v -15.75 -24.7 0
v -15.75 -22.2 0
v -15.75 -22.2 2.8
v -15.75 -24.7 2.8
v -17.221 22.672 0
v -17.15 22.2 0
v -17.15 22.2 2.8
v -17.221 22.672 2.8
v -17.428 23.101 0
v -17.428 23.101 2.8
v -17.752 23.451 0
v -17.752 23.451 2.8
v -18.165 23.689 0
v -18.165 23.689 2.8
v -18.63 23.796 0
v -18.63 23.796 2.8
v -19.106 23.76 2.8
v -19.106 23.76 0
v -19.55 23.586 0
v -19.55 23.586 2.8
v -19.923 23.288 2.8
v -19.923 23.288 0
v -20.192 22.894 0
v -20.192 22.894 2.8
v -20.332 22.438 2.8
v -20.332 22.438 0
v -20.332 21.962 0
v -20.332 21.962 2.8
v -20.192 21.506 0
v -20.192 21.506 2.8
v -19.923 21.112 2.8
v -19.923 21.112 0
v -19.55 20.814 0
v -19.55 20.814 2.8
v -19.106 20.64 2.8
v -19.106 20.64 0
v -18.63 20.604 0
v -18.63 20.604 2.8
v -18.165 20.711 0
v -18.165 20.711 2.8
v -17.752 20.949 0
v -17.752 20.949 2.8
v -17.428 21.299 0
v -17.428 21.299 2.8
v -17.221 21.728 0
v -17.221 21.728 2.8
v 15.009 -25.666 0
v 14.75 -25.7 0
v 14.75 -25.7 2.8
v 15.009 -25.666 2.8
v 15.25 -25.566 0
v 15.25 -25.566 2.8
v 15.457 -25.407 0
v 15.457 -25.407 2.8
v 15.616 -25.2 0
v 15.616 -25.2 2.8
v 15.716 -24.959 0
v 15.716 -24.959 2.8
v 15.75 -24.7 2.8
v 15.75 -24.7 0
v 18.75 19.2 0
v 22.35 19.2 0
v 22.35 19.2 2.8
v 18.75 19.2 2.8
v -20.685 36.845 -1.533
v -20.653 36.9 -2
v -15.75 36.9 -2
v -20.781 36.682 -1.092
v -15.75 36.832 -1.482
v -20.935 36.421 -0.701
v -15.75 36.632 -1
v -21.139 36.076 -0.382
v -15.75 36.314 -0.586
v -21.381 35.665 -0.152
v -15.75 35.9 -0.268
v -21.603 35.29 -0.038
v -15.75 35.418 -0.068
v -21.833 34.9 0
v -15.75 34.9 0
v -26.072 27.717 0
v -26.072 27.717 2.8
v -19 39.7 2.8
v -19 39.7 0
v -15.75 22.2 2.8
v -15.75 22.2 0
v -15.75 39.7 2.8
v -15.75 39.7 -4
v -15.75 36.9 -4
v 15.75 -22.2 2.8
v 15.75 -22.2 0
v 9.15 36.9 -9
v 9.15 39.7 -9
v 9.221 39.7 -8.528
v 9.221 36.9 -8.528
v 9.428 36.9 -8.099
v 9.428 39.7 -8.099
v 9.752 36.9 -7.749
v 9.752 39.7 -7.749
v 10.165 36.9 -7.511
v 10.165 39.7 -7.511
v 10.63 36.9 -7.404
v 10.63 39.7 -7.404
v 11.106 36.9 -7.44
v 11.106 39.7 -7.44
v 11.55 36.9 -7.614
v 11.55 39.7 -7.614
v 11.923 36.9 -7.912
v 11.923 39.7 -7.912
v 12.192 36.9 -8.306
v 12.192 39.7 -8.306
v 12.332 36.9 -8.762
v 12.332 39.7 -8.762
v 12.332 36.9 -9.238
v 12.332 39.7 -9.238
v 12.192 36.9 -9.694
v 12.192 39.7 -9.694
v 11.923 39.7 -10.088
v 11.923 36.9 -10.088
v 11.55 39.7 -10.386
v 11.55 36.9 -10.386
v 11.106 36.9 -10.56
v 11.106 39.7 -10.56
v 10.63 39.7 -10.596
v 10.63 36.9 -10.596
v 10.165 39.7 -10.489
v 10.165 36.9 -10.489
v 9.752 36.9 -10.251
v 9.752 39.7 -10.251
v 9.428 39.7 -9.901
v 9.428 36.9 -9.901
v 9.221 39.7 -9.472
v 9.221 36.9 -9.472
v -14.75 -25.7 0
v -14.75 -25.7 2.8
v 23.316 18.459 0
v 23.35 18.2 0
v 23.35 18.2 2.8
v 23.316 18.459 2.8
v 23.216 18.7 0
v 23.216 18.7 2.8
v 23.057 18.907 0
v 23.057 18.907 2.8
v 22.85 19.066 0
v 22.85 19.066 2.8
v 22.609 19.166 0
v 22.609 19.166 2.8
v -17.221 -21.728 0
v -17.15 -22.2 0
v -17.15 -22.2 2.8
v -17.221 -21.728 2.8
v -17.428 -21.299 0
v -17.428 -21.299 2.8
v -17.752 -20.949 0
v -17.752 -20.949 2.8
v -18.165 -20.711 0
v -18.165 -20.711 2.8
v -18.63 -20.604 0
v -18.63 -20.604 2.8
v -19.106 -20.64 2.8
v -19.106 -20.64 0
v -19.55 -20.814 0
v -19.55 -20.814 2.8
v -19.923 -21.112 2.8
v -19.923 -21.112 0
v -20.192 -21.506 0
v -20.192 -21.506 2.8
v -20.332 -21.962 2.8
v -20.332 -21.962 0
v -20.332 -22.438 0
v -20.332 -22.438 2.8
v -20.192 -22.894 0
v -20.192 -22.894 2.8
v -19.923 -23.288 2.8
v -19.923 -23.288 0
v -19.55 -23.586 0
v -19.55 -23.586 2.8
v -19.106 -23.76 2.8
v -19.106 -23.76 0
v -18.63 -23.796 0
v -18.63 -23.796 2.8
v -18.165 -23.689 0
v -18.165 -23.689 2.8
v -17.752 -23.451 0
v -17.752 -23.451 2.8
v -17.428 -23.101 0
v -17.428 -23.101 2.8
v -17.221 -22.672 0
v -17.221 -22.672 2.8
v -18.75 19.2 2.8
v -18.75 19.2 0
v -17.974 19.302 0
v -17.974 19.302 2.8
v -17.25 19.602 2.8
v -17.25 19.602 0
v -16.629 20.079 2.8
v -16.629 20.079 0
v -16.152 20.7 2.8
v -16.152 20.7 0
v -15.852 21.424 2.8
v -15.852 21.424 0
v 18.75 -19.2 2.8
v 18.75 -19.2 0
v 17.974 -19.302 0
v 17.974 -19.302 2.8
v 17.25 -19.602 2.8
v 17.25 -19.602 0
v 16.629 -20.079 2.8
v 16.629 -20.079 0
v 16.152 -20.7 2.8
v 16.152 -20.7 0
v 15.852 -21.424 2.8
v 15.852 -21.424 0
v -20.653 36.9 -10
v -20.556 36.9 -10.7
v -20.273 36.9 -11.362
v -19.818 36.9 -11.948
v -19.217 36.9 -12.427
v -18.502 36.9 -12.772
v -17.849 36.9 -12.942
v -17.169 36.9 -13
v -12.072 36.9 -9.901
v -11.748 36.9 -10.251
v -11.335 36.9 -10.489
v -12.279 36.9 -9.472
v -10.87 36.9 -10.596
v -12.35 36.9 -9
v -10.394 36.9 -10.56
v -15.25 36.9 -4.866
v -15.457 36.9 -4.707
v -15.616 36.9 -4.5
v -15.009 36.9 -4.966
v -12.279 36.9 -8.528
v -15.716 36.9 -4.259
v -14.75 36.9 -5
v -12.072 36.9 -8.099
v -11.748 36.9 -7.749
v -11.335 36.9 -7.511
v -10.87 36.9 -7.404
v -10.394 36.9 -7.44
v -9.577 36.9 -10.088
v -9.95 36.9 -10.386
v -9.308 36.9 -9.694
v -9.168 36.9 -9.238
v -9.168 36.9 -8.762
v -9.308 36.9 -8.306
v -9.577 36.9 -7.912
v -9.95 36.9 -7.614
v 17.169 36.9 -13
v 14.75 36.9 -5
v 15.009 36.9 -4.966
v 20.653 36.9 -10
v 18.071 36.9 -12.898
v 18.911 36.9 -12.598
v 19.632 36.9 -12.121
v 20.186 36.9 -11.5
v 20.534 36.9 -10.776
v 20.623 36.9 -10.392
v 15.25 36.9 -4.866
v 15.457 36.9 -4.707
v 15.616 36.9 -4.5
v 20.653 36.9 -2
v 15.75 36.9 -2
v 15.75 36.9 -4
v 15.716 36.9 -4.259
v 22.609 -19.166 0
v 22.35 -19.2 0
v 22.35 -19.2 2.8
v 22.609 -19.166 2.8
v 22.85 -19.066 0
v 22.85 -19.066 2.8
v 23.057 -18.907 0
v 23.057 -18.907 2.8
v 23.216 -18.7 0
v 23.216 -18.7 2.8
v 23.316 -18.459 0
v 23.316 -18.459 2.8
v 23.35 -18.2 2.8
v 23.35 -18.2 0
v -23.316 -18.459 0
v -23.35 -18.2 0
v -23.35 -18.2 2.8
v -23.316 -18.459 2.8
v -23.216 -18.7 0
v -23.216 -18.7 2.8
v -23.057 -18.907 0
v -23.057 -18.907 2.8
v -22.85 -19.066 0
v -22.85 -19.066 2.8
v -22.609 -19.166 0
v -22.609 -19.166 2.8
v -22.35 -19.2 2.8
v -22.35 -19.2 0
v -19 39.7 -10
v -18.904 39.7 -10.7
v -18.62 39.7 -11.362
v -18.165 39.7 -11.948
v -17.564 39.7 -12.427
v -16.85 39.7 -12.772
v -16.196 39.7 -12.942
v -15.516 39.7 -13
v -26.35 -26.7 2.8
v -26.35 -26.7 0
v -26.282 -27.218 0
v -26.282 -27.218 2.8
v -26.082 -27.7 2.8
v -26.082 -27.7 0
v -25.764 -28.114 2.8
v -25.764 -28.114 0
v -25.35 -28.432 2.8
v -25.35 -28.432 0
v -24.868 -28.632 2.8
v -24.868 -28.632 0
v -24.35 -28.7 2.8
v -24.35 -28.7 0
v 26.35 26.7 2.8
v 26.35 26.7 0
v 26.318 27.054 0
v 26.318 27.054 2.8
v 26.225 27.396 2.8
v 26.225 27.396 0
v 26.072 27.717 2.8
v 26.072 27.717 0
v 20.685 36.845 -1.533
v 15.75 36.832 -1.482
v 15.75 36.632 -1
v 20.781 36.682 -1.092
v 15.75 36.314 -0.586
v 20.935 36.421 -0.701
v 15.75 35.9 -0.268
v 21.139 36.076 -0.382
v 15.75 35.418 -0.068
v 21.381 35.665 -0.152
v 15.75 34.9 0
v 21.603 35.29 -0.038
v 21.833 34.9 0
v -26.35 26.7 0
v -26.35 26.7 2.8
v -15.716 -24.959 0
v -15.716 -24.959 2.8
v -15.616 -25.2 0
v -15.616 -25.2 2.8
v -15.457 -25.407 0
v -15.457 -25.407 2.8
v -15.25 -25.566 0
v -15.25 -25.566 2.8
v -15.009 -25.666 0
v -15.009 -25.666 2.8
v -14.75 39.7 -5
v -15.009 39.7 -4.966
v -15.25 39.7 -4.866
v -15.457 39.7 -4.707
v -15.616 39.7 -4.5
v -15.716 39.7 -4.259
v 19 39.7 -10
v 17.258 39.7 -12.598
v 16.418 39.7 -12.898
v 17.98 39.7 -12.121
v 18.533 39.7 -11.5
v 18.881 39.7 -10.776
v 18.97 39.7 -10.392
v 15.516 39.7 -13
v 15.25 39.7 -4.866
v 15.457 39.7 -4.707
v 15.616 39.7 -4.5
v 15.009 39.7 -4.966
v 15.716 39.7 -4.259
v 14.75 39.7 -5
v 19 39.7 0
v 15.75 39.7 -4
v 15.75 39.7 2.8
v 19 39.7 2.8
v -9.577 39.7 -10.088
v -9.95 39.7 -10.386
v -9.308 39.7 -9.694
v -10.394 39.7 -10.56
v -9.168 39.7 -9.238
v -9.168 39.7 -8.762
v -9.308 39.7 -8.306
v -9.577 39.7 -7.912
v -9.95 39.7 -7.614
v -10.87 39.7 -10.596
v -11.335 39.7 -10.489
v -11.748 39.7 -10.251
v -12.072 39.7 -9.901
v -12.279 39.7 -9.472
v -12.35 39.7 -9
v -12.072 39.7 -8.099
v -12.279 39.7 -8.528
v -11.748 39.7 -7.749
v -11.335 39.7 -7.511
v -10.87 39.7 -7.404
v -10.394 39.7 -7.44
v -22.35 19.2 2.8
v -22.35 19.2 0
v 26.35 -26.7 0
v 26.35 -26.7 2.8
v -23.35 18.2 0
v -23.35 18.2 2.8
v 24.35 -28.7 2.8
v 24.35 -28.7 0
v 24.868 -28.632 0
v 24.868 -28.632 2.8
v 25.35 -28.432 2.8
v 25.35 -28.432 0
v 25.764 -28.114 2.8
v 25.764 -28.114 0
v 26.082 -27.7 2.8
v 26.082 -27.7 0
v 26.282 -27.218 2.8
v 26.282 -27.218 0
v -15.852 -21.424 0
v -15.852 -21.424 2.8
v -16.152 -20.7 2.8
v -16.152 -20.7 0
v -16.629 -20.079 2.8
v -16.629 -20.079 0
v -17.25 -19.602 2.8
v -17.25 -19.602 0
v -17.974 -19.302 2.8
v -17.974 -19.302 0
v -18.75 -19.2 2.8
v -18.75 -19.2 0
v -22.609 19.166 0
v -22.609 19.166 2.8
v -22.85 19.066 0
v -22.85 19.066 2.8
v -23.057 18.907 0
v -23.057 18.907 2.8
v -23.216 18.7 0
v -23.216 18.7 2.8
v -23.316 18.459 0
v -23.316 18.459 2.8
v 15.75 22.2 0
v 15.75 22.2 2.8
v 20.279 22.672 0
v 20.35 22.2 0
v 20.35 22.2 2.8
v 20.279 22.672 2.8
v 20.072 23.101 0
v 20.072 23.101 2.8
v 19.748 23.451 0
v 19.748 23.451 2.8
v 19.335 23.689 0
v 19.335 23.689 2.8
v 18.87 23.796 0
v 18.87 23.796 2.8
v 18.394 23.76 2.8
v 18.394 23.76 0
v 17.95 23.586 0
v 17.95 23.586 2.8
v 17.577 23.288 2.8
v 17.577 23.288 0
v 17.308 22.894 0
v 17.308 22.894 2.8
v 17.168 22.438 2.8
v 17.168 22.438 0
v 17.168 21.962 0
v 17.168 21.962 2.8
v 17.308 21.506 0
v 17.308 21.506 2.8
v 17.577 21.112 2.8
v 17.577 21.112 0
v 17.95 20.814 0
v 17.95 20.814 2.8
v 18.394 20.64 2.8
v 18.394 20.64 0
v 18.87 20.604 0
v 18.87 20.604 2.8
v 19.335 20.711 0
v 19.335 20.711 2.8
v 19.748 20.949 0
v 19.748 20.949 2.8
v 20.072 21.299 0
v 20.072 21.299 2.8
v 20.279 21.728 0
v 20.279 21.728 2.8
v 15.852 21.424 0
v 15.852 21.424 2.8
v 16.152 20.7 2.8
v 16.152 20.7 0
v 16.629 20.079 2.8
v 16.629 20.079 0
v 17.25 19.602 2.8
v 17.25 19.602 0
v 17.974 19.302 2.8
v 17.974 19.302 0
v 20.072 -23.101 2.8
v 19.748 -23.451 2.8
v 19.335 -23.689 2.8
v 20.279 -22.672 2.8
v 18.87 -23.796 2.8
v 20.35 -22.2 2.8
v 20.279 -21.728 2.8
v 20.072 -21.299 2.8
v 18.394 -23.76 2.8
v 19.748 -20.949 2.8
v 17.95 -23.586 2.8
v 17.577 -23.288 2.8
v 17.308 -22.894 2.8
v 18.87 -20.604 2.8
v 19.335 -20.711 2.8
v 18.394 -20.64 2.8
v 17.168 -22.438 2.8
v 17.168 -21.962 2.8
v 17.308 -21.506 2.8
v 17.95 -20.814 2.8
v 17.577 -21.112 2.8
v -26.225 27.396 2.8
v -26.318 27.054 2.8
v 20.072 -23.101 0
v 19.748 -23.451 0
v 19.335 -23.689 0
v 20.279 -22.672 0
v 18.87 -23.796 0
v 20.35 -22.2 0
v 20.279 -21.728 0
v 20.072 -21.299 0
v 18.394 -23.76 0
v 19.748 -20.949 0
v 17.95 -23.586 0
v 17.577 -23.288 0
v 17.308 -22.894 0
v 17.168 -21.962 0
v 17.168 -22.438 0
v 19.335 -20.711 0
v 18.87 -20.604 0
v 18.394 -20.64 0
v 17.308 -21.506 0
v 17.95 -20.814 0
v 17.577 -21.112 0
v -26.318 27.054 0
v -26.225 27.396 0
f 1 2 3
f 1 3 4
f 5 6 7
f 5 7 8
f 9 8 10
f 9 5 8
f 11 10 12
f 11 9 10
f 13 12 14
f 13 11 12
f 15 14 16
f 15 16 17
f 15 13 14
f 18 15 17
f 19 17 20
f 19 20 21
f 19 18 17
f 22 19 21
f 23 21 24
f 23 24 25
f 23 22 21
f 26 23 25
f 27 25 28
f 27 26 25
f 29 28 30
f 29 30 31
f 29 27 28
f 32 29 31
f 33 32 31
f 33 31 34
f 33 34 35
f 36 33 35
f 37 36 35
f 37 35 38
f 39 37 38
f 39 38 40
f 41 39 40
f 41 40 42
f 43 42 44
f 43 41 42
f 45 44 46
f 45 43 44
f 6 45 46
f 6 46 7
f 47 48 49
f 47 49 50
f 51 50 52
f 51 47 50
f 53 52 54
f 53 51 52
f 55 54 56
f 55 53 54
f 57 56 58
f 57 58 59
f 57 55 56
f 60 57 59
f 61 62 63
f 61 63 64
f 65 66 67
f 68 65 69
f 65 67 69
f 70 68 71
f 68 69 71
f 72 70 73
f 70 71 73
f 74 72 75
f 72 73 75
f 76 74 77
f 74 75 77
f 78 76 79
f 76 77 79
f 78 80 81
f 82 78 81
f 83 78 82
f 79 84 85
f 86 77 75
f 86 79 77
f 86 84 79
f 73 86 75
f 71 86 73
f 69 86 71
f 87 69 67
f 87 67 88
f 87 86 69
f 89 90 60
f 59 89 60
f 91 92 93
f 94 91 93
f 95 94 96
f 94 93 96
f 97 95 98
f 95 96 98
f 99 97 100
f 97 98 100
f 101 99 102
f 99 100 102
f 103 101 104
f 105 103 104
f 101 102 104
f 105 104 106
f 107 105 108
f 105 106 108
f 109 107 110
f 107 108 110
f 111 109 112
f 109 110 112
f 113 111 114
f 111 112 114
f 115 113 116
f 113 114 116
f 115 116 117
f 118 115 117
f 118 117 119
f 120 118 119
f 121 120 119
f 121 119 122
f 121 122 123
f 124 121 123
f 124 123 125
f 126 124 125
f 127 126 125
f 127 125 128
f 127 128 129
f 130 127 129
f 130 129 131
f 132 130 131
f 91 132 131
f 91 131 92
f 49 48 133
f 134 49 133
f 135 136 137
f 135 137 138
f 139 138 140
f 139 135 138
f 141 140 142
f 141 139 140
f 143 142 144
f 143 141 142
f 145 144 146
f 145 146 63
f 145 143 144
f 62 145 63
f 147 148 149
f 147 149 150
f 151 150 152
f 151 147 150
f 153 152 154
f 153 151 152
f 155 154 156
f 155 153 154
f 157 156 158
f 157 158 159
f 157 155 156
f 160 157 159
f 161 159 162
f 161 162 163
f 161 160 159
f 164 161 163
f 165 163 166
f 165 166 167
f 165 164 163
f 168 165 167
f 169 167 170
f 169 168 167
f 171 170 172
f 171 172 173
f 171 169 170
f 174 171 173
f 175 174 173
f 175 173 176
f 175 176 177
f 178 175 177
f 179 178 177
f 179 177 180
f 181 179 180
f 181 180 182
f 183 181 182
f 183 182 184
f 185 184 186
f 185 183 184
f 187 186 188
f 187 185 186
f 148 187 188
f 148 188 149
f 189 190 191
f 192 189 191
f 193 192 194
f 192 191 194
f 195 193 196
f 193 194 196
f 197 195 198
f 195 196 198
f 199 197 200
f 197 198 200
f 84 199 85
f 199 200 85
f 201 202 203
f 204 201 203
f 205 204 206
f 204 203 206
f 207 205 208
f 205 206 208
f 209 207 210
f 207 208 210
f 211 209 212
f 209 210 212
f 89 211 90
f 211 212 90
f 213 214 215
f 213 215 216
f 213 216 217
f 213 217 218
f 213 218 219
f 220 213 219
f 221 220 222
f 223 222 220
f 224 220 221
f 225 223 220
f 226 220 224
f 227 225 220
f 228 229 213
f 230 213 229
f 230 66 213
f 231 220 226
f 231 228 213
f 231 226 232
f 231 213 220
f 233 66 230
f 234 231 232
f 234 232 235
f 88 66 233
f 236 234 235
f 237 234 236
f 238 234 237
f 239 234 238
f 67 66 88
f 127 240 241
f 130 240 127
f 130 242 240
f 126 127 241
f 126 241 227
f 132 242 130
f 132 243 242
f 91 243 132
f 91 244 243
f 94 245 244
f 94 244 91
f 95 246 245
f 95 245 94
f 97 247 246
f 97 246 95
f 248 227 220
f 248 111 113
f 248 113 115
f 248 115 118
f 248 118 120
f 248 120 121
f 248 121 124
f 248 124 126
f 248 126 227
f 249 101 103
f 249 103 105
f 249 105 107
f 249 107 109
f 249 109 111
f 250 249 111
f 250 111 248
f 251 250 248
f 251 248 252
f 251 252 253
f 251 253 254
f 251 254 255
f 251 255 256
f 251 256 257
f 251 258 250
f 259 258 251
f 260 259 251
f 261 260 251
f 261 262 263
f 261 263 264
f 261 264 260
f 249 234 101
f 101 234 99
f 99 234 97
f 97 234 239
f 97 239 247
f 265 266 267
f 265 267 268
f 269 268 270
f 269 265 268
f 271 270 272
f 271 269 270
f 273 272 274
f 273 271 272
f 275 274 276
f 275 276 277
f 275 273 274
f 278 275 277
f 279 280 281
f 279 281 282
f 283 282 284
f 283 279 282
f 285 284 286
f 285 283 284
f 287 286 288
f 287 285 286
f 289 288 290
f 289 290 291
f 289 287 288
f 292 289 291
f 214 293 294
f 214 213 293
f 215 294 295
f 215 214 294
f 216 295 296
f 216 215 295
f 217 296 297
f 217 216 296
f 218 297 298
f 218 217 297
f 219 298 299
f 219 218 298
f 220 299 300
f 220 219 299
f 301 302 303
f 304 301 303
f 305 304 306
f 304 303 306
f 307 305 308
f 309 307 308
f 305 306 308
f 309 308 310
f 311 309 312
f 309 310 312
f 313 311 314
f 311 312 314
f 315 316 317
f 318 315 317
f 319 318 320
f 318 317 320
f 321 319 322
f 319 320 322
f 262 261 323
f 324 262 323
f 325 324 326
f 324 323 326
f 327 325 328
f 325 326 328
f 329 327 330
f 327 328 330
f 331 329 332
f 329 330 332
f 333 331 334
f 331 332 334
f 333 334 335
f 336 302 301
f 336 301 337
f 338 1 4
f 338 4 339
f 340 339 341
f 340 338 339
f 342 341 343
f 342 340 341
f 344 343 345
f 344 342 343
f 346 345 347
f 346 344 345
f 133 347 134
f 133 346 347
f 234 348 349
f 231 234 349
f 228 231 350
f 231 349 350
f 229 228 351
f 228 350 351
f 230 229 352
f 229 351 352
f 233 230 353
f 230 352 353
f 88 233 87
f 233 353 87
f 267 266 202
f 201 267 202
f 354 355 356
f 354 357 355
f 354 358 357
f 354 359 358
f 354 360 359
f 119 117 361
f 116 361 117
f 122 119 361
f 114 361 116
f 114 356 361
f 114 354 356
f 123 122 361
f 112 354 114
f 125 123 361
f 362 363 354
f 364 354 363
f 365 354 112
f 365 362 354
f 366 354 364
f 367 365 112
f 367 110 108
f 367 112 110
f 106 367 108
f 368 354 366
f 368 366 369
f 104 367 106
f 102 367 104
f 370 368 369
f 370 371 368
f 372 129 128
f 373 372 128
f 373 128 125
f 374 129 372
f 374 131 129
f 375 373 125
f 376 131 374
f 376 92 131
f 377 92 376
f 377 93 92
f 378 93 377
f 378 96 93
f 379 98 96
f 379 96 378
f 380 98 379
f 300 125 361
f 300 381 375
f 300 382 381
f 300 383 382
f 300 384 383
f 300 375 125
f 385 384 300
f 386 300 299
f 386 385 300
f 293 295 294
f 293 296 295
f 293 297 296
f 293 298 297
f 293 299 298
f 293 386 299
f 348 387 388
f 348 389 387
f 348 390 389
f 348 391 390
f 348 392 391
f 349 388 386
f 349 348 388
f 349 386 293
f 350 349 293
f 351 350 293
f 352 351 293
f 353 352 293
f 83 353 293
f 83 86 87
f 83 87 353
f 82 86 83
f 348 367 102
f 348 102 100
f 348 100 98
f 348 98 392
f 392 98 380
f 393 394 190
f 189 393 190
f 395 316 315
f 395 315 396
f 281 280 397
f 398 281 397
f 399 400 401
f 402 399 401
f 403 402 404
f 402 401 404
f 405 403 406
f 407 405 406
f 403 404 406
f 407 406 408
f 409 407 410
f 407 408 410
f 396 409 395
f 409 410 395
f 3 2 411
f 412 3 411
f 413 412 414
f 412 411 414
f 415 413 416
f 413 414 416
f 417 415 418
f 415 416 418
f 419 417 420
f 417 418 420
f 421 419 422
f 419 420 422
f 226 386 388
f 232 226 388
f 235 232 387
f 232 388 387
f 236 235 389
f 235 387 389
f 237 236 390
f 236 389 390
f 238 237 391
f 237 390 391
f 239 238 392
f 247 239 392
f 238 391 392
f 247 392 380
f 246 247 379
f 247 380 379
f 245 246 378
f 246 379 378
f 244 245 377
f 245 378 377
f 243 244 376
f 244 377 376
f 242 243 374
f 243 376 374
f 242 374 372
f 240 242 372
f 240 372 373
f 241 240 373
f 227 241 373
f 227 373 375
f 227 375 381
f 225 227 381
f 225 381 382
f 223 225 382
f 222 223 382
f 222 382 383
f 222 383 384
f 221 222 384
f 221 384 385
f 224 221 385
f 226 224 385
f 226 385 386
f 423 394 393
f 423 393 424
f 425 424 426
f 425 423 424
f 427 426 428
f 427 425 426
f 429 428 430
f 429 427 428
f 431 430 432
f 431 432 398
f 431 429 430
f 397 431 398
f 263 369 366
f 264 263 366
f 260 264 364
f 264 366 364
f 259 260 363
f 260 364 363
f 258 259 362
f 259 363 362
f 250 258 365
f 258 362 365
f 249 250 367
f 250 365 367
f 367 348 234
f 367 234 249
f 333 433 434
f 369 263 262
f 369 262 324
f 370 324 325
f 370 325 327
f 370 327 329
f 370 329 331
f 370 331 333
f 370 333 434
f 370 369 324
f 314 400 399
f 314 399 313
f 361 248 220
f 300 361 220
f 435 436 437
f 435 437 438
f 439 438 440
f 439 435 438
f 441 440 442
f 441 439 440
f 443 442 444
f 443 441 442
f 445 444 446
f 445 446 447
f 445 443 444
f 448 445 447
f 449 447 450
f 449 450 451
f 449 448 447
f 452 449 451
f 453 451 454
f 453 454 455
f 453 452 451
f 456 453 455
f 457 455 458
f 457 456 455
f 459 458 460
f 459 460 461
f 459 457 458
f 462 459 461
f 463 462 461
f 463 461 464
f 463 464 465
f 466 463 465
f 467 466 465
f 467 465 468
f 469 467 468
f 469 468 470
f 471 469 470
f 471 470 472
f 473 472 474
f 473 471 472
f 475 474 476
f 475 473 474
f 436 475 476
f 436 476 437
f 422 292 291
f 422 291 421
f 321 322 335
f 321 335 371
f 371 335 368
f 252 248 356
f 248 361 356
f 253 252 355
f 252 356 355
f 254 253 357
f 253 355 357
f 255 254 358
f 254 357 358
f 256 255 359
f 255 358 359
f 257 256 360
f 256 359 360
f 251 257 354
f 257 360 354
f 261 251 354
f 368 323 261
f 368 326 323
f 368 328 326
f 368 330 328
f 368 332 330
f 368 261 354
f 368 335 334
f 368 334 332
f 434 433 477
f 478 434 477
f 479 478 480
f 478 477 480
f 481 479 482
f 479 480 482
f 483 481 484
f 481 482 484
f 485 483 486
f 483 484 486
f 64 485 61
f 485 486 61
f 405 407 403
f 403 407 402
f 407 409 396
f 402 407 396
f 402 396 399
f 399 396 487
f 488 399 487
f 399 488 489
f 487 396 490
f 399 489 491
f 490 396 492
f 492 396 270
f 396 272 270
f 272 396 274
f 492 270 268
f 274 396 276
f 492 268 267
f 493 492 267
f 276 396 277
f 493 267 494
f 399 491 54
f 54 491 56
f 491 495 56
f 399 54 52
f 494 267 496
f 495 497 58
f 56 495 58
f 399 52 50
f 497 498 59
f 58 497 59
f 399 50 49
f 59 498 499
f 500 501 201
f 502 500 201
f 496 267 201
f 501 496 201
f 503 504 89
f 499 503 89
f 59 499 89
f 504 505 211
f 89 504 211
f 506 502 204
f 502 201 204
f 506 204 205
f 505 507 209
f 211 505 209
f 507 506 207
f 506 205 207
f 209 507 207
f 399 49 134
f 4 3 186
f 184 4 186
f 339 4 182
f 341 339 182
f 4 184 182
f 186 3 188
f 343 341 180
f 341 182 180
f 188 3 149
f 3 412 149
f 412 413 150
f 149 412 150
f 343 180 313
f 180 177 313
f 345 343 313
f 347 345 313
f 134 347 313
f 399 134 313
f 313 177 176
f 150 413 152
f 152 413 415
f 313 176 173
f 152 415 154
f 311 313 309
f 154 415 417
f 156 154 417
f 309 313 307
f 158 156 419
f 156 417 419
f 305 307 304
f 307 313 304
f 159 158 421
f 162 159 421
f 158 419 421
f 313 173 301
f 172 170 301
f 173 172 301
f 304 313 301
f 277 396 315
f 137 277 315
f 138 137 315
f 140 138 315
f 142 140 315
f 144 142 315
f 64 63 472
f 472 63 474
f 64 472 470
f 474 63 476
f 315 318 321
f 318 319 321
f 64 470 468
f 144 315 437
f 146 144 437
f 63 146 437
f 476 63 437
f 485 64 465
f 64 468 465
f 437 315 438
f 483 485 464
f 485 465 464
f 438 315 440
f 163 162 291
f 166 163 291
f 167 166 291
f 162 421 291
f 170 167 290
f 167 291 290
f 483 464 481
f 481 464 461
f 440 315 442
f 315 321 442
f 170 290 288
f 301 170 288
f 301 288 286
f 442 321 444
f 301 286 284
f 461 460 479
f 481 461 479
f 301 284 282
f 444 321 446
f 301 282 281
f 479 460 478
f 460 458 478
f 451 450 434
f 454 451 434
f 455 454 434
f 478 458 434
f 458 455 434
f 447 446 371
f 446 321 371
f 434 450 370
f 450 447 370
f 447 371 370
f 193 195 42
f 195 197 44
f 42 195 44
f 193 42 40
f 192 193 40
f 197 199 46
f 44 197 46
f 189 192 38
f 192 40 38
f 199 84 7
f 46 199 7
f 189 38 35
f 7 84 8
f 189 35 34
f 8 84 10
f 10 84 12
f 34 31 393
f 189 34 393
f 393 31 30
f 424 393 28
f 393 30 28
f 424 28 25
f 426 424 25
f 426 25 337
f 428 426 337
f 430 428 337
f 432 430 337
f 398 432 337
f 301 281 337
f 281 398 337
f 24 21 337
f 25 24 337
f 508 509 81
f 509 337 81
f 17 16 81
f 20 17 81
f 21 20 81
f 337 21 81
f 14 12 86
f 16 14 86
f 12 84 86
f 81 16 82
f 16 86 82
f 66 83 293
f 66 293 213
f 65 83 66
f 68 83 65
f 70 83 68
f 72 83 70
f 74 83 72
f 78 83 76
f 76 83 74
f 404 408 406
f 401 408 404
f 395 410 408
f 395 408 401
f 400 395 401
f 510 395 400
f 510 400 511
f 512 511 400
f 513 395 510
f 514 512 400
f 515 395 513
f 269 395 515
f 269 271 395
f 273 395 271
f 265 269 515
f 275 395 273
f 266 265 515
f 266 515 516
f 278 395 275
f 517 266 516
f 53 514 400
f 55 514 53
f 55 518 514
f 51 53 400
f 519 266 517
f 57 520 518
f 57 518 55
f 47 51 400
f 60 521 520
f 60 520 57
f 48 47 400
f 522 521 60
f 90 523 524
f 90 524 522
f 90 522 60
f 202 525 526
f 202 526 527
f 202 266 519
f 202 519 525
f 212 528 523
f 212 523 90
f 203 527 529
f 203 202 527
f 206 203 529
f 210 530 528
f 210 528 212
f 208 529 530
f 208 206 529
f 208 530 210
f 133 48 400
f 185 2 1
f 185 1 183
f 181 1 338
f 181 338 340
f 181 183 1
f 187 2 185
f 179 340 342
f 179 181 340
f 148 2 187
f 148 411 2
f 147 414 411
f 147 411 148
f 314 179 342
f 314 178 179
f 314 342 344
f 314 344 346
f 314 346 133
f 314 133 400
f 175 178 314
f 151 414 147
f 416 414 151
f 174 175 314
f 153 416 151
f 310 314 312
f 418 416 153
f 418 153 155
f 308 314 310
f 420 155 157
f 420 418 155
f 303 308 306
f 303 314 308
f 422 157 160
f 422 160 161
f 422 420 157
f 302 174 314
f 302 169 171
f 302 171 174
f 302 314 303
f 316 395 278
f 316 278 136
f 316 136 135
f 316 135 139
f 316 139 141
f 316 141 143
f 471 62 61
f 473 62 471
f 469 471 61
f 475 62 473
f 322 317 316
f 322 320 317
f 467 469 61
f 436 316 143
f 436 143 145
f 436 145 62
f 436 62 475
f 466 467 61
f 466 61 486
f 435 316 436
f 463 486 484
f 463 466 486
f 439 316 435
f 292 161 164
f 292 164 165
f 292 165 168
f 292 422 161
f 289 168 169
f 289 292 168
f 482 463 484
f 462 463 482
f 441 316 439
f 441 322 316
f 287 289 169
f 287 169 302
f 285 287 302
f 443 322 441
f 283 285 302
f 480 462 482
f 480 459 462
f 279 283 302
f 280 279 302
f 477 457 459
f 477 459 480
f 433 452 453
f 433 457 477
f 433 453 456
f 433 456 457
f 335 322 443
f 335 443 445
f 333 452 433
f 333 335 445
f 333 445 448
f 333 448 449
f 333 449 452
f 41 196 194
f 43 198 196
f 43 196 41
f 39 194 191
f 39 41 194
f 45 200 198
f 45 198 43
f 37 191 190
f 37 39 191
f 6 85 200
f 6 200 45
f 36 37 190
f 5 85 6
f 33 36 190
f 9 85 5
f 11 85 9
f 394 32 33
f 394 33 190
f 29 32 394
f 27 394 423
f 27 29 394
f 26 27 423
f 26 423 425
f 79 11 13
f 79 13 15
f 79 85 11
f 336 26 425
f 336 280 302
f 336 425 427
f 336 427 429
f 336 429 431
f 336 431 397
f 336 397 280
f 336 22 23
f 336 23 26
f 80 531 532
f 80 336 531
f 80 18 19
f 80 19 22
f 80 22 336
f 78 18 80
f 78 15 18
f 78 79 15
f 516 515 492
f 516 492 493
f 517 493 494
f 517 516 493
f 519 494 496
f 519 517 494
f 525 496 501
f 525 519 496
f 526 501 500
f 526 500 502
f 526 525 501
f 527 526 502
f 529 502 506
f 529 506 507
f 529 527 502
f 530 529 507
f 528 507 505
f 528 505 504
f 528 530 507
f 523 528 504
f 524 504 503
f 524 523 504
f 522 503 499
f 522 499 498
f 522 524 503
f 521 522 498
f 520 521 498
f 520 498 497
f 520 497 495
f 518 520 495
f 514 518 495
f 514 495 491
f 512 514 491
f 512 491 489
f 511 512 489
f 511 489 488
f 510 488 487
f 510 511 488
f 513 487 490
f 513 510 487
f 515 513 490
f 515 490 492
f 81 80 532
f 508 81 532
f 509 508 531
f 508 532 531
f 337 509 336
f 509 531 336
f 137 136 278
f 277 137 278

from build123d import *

# Parameters (mm, degrees)
SKETCH_R     = 1.6
PAD_DEPTH    = 2.8
PAD001_DEPTH = 13
FILLET_R     = 2
SKETCH002_R  = 1.6
HOLE_DEPTH   = 68.401
FILLET001_R  = 3
POCKET_DEPTH = 2.8


with BuildPart() as part:
    # Sketch → Pad (new body)
    with BuildSketch(Plane.XY):
        with BuildLine():
            Line((26.35, 26.7), (26.35, -26.7))
            ThreePointArc((24.35, -28.7), (25.764214, -28.114214), (26.35, -26.7))
            Line((24.35, -28.7), (-24.35, -28.7))
            ThreePointArc((-26.35, -26.7), (-25.764214, -28.114214), (-24.35, -28.7))
            Line((-26.35, -26.7), (-26.35, 26.7))
            ThreePointArc((-26.072403, 27.716527), (-26.279353, 27.226875), (-26.35, 26.7))
            Line((-26.072403, 27.716527), (-19, 39.7))
            Line((-19, 39.7), (19, 39.7))
            Line((26.072403, 27.716527), (19, 39.7))
            ThreePointArc((26.35, 26.7), (26.279353, 27.226875), (26.072403, 27.716527))
        make_face()
        with Locations((-18.75, -22.2)):
            Circle(SKETCH_R, mode=Mode.SUBTRACT)
        with Locations((18.75, -22.2)):
            Circle(SKETCH_R, mode=Mode.SUBTRACT)
        with Locations((18.75, 22.2)):
            Circle(SKETCH_R, mode=Mode.SUBTRACT)
        with Locations((-18.75, 22.2)):
            Circle(SKETCH_R, mode=Mode.SUBTRACT)
        with BuildLine():
            Line((-15.75, 36.9), (15.75, 36.9))
            Line((15.75, 22.2), (15.75, 36.9))
            ThreePointArc((15.75, 22.2), (16.62868, 20.07868), (18.75, 19.2))
            Line((22.35, 19.2), (18.75, 19.2))
            ThreePointArc((23.35, 18.2), (23.057107, 18.907107), (22.35, 19.2))
            Line((23.35, 18.2), (23.35, -18.2))
            ThreePointArc((22.35, -19.2), (23.057107, -18.907107), (23.35, -18.2))
            Line((22.35, -19.2), (18.75, -19.2))
            ThreePointArc((18.75, -19.2), (16.62868, -20.07868), (15.75, -22.2))
            Line((15.75, -22.2), (15.75, -24.7))
            ThreePointArc((14.75, -25.7), (15.457107, -25.407107), (15.75, -24.7))
            Line((14.75, -25.7), (-14.75, -25.7))
            ThreePointArc((-15.75, -24.7), (-15.457107, -25.407107), (-14.75, -25.7))
            Line((-15.75, -22.2), (-15.75, -24.7))
            ThreePointArc((-15.75, -22.2), (-16.62868, -20.07868), (-18.75, -19.2))
            Line((-22.35, -19.2), (-18.75, -19.2))
            ThreePointArc((-23.35, -18.2), (-23.057107, -18.907107), (-22.35, -19.2))
            Line((-23.35, -18.2), (-23.35, 18.2))
            ThreePointArc((-22.35, 19.2), (-23.057107, 18.907107), (-23.35, 18.2))
            Line((-22.35, 19.2), (-18.75, 19.2))
            ThreePointArc((-18.75, 19.2), (-16.62868, 20.07868), (-15.75, 22.2))
            Line((-15.75, 22.2), (-15.75, 36.9))
        make_face(mode=Mode.SUBTRACT)
    extrude(amount=PAD_DEPTH)

    # Sketch001 (on Face37 of Pad) → Pad001 (join)
    with BuildSketch(Plane(origin=(0, 0, 0), x_dir=(1, 0, 0), z_dir=(0, 0, -1))):
        Polygon((-20.652503, -36.9), (20.652503, -36.9), (19, -39.7), (-19, -39.7), align=None)
    extrude(amount=PAD001_DEPTH)

    # Fillet
    fillet_edges = [part.edges().sort_by_distance(p)[0] for p in [
        (-18.201252, 36.9, 0),
        (18.201252, 36.9, 0),
    ]]
    fillet(fillet_edges, radius=FILLET_R)

    # Sketch002 (on Face45 of Fillet) → Hole (cut, through all)
    with BuildSketch(Plane(origin=(0, 39.7, 0), x_dir=(-1, 0, 0), z_dir=(0, 1, 0))):
        with Locations((-10.75, -9)):
            Circle(SKETCH002_R)
        with Locations((10.75, -9)):
            Circle(SKETCH002_R)
    extrude(amount=-HOLE_DEPTH, mode=Mode.SUBTRACT)

    # Fillet001
    fillet001_edges = [part.edges().sort_by_distance(p)[0] for p in [
        (-19.826252, 38.3, -13),
        (19.826252, 38.3, -13),
    ]]
    fillet(fillet001_edges, radius=FILLET001_R)

    # Sketch003 (on Face5 of Fillet001) → Pocket (cut)
    with BuildSketch(Plane(origin=(0, 39.7, 0), x_dir=(-1, 0, 0), z_dir=(0, 1, 0))):
        with BuildLine():
            Line((-15.75, 2.8), (15.75, 2.8))
            Line((15.75, 2.8), (15.75, -4))
            ThreePointArc((14.75, -5), (15.457107, -4.707107), (15.75, -4))
            Line((14.75, -5), (-14.75, -5))
            ThreePointArc((-15.75, -4), (-15.457107, -4.707107), (-14.75, -5))
            Line((-15.75, -4), (-15.75, 2.8))
        make_face()
    extrude(amount=-POCKET_DEPTH, mode=Mode.SUBTRACT)


solid = part.part
